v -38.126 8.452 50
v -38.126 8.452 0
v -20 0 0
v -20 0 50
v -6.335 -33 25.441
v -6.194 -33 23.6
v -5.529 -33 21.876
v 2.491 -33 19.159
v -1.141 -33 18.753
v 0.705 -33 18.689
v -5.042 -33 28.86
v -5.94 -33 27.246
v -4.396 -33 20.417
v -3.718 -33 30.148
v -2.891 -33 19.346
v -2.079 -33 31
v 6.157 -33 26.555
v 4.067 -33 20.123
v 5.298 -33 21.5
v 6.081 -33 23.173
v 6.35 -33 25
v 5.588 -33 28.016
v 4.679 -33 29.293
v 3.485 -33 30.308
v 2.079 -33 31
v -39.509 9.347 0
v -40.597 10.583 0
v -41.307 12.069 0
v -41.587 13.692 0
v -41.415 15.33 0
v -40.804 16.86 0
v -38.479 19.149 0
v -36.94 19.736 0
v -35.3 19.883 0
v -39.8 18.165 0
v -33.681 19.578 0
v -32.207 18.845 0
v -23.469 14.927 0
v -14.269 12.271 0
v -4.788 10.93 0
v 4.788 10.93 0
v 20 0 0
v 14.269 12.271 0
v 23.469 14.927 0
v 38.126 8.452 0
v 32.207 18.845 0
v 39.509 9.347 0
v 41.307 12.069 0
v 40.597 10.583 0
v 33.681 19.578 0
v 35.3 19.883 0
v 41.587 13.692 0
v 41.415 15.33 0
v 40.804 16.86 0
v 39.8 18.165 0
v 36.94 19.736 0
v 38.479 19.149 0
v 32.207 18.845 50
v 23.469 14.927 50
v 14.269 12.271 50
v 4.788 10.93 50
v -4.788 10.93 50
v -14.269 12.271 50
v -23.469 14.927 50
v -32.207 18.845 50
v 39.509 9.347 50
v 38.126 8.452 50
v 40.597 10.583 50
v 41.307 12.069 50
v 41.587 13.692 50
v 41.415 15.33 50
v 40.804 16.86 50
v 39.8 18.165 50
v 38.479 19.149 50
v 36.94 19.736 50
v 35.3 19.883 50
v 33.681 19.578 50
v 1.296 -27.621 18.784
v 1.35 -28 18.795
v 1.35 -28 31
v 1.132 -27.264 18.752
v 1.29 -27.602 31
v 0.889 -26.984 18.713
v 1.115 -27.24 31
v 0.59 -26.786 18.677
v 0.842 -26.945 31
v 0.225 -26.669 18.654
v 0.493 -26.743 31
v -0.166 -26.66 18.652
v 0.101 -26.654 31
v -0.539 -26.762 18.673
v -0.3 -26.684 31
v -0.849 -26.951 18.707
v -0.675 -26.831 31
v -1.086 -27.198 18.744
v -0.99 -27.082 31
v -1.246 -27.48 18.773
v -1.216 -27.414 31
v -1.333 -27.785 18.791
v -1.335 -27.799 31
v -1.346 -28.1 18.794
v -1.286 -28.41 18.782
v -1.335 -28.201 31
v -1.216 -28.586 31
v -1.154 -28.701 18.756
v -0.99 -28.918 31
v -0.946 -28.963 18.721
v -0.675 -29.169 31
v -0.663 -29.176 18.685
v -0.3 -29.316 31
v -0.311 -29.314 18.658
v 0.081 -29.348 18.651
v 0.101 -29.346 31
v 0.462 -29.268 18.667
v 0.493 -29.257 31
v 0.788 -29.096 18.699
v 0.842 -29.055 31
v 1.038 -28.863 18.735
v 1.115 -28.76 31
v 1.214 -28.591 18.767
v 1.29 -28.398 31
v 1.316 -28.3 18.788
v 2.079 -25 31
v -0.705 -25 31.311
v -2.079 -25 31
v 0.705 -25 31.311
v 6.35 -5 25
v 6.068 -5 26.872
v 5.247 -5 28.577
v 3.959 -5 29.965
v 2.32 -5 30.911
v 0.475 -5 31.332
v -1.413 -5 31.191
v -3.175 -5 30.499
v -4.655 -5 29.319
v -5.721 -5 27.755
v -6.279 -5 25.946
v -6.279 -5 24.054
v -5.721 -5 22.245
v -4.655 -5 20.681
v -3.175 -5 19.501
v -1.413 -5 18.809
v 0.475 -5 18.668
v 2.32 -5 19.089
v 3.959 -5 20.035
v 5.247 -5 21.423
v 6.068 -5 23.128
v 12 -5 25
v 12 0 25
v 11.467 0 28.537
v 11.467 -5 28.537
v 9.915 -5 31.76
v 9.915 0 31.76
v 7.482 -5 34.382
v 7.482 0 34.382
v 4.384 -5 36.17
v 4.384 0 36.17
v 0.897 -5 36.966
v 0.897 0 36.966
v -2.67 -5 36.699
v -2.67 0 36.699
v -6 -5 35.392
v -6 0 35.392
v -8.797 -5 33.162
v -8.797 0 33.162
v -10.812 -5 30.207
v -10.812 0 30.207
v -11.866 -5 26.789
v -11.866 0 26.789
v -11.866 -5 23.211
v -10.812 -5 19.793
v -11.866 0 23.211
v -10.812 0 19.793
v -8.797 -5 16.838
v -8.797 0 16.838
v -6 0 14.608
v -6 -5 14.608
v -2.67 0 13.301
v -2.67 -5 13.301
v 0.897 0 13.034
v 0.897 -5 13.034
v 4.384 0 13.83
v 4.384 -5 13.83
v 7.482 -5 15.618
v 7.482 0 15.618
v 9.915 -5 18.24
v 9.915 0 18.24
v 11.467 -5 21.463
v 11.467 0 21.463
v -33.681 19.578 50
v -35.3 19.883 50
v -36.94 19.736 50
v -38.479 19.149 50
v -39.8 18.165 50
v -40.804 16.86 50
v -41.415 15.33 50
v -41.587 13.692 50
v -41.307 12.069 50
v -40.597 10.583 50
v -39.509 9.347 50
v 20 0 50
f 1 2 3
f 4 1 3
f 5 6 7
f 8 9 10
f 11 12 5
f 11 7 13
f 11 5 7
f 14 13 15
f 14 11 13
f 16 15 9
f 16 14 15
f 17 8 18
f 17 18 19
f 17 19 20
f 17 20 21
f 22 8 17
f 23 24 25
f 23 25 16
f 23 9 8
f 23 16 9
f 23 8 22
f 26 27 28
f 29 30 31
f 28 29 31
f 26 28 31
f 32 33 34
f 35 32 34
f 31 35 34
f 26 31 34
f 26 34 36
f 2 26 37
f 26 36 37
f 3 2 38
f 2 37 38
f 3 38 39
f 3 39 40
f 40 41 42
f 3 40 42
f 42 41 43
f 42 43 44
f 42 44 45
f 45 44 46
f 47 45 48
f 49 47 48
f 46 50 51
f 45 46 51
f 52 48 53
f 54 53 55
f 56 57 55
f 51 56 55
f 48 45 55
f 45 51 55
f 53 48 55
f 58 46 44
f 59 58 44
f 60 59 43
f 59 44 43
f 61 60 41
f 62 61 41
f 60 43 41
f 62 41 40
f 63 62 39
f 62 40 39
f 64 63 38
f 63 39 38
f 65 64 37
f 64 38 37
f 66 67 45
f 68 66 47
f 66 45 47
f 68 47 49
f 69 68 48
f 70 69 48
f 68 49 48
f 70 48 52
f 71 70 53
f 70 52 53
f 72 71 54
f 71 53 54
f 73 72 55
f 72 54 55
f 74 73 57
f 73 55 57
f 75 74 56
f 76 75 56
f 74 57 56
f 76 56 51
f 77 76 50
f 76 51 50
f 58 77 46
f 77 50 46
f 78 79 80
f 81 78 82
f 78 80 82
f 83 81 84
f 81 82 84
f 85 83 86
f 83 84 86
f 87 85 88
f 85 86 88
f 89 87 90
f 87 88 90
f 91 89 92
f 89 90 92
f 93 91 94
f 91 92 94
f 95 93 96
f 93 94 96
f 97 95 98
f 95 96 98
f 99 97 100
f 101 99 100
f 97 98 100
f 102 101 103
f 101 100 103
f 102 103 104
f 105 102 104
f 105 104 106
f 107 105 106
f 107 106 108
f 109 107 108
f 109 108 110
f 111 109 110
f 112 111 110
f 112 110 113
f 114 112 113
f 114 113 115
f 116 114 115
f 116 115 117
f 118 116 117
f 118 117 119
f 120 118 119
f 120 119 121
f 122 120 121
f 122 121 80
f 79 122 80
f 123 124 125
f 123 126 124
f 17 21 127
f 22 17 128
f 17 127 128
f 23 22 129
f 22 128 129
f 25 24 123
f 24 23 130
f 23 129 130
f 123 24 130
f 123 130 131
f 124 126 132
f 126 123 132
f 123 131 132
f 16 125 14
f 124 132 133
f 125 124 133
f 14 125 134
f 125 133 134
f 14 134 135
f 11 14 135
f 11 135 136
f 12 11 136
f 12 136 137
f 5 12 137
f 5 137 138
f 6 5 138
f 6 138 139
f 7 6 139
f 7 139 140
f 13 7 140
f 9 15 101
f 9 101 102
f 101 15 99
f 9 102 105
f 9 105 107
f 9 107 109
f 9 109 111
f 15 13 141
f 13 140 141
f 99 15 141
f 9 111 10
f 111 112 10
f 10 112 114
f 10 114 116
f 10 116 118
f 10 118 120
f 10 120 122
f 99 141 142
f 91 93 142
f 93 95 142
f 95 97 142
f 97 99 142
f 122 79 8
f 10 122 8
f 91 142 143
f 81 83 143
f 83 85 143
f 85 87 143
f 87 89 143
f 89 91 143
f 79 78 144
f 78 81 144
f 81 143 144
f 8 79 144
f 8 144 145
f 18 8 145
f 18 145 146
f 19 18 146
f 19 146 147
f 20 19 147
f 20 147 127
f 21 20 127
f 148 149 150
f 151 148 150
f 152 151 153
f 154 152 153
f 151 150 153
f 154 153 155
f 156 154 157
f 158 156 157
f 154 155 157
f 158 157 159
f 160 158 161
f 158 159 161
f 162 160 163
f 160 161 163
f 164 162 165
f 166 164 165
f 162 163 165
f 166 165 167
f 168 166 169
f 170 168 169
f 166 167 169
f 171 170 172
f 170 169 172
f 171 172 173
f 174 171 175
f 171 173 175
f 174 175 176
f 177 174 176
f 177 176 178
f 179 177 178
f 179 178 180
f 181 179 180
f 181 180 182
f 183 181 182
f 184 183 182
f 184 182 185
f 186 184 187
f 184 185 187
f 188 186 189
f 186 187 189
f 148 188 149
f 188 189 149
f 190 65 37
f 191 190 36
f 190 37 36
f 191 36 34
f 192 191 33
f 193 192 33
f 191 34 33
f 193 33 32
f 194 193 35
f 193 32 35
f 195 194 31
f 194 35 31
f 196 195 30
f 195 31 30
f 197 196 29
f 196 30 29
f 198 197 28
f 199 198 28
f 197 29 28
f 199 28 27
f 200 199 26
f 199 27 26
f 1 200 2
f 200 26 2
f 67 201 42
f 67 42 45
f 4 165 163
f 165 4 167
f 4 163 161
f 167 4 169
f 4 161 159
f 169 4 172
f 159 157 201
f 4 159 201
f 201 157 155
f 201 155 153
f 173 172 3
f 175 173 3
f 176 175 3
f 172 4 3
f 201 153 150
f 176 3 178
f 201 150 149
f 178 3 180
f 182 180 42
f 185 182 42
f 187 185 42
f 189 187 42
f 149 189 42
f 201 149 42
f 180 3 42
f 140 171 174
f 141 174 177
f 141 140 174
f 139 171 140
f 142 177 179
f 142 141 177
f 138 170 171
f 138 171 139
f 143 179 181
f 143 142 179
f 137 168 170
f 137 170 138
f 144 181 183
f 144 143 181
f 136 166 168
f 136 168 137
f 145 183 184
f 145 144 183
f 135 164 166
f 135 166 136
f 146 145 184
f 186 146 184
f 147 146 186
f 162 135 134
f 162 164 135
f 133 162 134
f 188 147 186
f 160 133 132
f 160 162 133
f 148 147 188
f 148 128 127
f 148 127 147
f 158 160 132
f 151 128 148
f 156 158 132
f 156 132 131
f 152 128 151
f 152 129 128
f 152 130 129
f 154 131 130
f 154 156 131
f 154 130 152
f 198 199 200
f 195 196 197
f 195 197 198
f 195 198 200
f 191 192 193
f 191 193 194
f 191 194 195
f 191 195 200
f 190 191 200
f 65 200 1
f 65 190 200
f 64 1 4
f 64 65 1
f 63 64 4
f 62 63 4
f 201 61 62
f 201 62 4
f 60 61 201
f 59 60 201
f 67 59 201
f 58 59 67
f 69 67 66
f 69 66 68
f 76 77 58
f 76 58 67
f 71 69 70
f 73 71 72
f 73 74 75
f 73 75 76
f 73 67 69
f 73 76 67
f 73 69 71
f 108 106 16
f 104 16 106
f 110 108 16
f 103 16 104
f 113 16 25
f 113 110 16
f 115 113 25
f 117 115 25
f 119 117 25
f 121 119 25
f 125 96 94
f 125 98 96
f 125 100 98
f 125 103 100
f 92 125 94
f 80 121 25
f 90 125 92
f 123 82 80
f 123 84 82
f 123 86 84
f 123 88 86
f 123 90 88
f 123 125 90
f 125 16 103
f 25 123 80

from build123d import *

# Parameters (mm, degrees)
F1_DEPTH = 50
F2_R     = 12
F3_DEPTH = 5
F4_R     = 6.35
F5_DEPTH = 28
F6_W     = 36.939165
F6_H     = 22.77072
F7_DEPTH = 19
F8_R     = 1.35
F9_DEPTH = 31.001


with BuildPart() as f1:
    # F0 (on Top) → F1 (new body)
    with BuildSketch(Plane.XY):
        with BuildLine():
            Line((-38.126156, 8.452365), (-20, 0))
            Line((-20, 0), (20, 0))
            Line((20, 0), (38.126156, 8.452365))
            ThreePointArc((38.126156, 8.452365), (40.804064, 16.859756), (32.20674, 18.845061))
            ThreePointArc((32.20674, 18.845061), (0, 10.761955), (-32.20674, 18.845061))
            ThreePointArc((-32.20674, 18.845061), (-40.804064, 16.859756), (-38.126156, 8.452365))
        make_face()
    extrude(amount=F1_DEPTH)

    # F2 (on face) → F3 (join)
    with BuildSketch(Plane.XZ):
        with Locations((0, 25)):
            Circle(F2_R)
    extrude(amount=F3_DEPTH)

    # F4 (on face) → F5 (join)
    with BuildSketch(Plane.XZ.offset(5)):
        with Locations((0, 25)):
            Circle(F4_R)
    extrude(amount=F5_DEPTH)

    # F6 (on face) → F7 (cut)
    with BuildSketch(Plane.XY.offset(50)):
        with Locations((0.371061, -36.38536)):
            Rectangle(F6_W, F6_H)
    extrude(amount=-F7_DEPTH, mode=Mode.SUBTRACT)

    # F8 (on face) → F9 (cut, through all)
    with BuildSketch(Plane.XY.offset(31)):
        with Locations((0, -28)):
            Circle(F8_R)
    extrude(amount=-F9_DEPTH, mode=Mode.SUBTRACT)


solid = f1.part
